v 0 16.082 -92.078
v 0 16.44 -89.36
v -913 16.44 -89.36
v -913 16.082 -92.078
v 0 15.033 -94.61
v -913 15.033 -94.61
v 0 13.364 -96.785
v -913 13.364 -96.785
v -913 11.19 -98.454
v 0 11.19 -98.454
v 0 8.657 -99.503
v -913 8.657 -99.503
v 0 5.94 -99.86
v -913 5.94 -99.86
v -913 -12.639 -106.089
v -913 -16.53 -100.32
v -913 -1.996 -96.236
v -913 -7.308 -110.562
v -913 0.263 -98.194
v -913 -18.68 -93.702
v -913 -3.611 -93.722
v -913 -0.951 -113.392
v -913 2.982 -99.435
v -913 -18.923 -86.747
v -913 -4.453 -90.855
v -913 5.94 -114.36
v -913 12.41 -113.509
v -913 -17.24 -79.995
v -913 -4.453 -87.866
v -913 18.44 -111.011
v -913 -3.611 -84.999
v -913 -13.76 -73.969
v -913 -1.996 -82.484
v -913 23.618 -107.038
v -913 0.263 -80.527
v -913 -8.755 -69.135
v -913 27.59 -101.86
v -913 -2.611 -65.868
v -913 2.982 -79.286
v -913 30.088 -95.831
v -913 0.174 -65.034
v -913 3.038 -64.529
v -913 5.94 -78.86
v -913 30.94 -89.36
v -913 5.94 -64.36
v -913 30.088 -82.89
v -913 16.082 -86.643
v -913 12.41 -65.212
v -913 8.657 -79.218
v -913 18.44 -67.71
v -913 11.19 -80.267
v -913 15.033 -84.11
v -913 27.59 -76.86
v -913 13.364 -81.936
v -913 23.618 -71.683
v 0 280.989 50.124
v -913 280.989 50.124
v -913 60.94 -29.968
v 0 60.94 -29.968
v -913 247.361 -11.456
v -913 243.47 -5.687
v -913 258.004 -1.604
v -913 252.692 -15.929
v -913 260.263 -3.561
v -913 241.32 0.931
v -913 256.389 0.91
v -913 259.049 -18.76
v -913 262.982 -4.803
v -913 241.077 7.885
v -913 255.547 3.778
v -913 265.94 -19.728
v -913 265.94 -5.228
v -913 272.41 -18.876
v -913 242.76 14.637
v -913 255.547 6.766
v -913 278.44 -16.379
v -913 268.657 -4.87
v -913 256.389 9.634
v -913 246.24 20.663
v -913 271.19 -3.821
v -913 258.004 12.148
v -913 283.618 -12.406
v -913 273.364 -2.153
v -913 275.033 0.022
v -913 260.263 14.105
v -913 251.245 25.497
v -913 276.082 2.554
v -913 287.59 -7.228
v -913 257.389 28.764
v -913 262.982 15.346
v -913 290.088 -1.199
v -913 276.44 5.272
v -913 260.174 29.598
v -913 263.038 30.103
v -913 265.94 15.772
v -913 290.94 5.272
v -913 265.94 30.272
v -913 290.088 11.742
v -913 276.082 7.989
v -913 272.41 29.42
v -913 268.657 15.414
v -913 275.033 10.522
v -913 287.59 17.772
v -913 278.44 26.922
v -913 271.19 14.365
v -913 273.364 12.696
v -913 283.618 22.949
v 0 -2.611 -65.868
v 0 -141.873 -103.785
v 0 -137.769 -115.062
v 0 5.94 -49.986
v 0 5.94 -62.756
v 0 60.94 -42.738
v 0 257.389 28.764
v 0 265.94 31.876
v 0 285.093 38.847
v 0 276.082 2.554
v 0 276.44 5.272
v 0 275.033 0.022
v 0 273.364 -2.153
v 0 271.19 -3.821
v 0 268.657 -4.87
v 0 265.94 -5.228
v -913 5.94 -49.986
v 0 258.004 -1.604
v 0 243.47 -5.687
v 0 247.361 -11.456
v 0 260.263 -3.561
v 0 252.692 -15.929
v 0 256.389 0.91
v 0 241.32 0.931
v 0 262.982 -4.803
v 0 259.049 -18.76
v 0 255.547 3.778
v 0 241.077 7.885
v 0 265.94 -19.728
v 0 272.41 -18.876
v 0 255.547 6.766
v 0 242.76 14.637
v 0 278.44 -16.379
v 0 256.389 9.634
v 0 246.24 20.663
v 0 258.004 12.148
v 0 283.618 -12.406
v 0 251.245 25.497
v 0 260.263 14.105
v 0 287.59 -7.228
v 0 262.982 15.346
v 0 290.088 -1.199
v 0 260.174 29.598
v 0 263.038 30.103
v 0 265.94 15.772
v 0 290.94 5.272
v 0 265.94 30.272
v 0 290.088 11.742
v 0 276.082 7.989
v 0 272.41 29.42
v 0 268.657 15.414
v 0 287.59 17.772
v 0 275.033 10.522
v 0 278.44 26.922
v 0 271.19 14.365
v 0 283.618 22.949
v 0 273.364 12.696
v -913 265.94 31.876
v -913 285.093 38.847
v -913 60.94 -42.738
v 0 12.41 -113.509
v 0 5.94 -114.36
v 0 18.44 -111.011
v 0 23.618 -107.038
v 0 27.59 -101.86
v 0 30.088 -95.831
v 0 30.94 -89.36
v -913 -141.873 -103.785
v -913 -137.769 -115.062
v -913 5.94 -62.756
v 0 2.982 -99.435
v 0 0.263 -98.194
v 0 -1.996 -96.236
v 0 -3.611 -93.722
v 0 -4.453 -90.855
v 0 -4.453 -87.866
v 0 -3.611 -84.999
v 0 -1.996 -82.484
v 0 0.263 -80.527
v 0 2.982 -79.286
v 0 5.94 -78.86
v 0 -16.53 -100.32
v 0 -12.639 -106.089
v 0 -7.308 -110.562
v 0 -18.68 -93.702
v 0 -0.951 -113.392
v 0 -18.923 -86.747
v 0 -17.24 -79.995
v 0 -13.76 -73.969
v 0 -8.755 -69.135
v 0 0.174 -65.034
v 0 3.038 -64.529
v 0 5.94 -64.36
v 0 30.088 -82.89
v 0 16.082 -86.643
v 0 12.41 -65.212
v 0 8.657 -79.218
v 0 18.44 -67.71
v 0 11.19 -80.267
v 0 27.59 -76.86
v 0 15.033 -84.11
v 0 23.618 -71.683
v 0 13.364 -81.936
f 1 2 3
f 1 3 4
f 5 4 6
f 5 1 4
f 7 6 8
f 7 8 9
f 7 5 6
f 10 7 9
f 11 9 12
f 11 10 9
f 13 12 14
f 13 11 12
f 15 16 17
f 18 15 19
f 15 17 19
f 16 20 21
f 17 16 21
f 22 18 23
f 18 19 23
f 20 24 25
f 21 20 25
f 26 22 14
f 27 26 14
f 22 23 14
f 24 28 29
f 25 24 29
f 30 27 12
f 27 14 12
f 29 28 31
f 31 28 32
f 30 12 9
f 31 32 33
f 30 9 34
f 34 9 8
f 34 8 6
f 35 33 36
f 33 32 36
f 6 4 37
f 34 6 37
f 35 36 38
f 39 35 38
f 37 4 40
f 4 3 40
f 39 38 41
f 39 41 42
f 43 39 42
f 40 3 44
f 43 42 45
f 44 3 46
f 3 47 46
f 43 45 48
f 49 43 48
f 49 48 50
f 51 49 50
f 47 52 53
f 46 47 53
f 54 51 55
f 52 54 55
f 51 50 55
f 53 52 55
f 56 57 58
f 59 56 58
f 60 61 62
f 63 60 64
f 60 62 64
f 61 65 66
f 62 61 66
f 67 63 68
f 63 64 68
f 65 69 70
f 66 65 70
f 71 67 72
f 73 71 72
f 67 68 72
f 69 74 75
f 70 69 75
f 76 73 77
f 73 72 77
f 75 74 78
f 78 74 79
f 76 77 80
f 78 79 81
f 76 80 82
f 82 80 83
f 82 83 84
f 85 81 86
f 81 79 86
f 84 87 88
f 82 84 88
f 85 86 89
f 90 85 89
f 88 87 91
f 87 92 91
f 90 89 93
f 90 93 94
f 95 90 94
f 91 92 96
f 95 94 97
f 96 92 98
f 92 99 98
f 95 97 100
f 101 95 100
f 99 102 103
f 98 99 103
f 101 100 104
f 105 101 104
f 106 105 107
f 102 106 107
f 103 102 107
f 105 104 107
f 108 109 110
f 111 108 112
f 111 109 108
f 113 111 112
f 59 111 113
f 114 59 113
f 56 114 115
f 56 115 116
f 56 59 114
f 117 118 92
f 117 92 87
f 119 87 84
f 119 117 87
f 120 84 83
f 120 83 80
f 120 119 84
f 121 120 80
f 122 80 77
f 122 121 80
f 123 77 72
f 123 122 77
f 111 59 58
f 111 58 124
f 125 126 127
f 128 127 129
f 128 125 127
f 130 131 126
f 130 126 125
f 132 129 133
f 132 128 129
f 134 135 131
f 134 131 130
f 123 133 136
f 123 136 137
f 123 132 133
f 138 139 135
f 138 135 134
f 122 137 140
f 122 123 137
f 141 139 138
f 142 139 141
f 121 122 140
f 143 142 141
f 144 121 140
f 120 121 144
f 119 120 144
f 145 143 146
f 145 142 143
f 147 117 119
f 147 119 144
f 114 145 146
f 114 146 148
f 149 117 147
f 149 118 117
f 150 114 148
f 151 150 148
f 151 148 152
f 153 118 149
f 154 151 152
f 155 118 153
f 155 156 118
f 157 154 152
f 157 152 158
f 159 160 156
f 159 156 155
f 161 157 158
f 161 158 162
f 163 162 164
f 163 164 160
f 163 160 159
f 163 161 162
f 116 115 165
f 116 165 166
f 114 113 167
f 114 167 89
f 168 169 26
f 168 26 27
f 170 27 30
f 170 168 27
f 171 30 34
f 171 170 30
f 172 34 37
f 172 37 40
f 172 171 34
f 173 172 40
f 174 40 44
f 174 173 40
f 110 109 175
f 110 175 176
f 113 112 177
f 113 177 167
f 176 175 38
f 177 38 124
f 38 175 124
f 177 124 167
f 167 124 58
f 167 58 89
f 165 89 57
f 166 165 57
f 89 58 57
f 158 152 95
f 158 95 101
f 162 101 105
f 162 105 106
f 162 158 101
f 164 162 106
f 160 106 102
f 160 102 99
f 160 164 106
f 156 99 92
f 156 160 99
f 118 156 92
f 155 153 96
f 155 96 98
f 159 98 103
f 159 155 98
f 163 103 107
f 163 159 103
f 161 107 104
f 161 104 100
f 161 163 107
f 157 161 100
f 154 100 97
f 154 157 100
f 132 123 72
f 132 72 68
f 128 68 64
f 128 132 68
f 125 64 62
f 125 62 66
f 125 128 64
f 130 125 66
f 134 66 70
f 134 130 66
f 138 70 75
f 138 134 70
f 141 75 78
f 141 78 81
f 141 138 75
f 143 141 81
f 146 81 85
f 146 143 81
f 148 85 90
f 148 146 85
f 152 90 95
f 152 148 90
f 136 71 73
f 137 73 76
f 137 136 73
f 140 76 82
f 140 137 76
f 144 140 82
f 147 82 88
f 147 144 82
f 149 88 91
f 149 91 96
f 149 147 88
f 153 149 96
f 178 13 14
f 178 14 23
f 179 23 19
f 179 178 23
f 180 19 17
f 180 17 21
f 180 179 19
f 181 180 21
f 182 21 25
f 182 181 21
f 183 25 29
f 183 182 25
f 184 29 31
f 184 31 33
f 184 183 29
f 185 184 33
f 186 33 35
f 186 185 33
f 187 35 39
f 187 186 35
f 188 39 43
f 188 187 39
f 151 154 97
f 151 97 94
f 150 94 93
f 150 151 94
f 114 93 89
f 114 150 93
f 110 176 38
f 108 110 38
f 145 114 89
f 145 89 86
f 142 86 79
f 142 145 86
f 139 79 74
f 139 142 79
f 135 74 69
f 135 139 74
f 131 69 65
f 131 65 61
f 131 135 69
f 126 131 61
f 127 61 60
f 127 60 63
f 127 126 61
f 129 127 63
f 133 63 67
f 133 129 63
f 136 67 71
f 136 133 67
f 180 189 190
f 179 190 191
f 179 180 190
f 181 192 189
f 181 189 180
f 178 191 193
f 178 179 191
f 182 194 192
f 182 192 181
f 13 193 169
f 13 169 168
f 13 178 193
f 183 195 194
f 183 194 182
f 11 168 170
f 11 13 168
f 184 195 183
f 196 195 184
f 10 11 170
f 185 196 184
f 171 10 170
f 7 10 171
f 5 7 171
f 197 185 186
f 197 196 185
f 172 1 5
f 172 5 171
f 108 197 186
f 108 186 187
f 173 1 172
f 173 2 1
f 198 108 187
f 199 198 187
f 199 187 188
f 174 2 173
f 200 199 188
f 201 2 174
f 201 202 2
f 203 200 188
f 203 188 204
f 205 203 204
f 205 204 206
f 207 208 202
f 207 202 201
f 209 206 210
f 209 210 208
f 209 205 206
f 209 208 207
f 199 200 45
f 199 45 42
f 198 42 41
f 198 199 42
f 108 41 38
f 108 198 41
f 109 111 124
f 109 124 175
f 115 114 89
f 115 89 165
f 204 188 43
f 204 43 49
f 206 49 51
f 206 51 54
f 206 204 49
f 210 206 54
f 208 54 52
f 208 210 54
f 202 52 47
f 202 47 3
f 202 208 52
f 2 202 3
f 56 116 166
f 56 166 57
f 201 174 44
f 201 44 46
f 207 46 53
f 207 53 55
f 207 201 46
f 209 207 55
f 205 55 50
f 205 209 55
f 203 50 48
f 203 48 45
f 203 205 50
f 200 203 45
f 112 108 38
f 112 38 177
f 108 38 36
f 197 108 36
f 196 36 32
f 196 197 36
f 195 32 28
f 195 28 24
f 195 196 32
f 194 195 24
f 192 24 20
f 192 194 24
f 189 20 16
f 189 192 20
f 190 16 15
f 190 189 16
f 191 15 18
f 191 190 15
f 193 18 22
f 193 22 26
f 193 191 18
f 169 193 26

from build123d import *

# Parameters (mm, degrees)
F1_DEPTH = 913


with BuildPart() as f1:
    # F0 (on Right) → F1 (new body)
    with BuildSketch(Plane.YZ):
        with BuildLine():
            ThreePointArc((30.9398380864, -89.3604465055), (23.617507616, -71.6827769758), (5.9398380864, -64.3604465055))
            Line((5.9398380864, -64.3604465055), (5.9398380864, -78.8604465055))
            ThreePointArc((5.9398380864, -78.8604465055), (13.3644592888, -81.935825303), (16.4398380864, -89.3604465055))
            ThreePointArc((16.4398380864, -89.3604465055), (13.3644592888, -96.785067708), (5.9398380864, -99.8604465055))
            Line((5.9398380864, -99.8604465055), (5.9398380864, -114.3604465055))
            ThreePointArc((5.9398380864, -114.3604465055), (23.617507616, -107.0381160352), (30.9398380864, -89.3604465055))
        make_face()
        with BuildLine():
            Line((5.9398380864, -78.8604465055), (5.9398380864, -64.3604465055))
            ThreePointArc((5.9398380864, -64.3604465055), (1.5986338258, -64.7402526483), (-2.6106651512, -65.8681308601))
            ThreePointArc((-2.6106651512, -65.8681308601), (-18.6803557709, -93.7016507661), (5.9398380864, -114.3604465055))
            Line((5.9398380864, -114.3604465055), (5.9398380864, -99.8604465055))
            ThreePointArc((5.9398380864, -99.8604465055), (-4.5601619136, -89.3604465055), (5.9398380864, -78.8604465055))
        make_face()
    extrude(amount=-F1_DEPTH)


with BuildPart() as f1b:
    # F0 (on Right) → F1, piece 2 (new body)
    with BuildSketch(Plane.YZ):
        with BuildLine():
            ThreePointArc((290.9398380864, 5.2718144037), (283.617507616, 22.9494839334), (265.9398380864, 30.2718144037))
            Line((265.9398380864, 30.2718144037), (265.9398380864, 15.7718144037))
            ThreePointArc((265.9398380864, 15.7718144037), (273.3644592888, 12.6964356062), (276.4398380864, 5.2718144037))
            ThreePointArc((276.4398380864, 5.2718144037), (273.3644592888, -2.1528067987), (265.9398380864, -5.2281855963))
            Line((265.9398380864, -5.2281855963), (265.9398380864, -19.7281855963))
            ThreePointArc((265.9398380864, -19.7281855963), (283.617507616, -12.4058551259), (290.9398380864, 5.2718144037))
        make_face()
        with BuildLine():
            ThreePointArc((265.9398380864, 30.2718144037), (261.5986329076, 29.892008099), (257.3893330965, 28.7641294114))
            ThreePointArc((257.3893330965, 28.7641294114), (241.319644391, 0.9306092249), (265.9398380864, -19.7281855963))
            Line((265.9398380864, -19.7281855963), (265.9398380864, -5.2281855963))
            ThreePointArc((265.9398380864, -5.2281855963), (255.4398380864, 5.2718144037), (265.9398380864, 15.7718144037))
            Line((265.9398380864, 15.7718144037), (265.9398380864, 30.2718144037))
        make_face()
    extrude(amount=-F1_DEPTH)


with BuildPart() as f1c:
    # F0 (on Right) → F1, piece 3 (new body)
    with BuildSketch(Plane.YZ):
        Polygon((265.9398380864, 44.6463919853), (60.9398380864, -29.9675060392), (60.9398380864, -42.737639309), (257.3893330965, 28.7641294114), (265.9398380864, 31.8762587156), align=None)
        Polygon((60.9398380864, -29.9675060392), (5.9398380864, -49.9858689239), (5.9398380864, -62.7560021936), (60.9398380864, -42.737639309), align=None)
        Polygon((5.9398380864, -62.7560021936), (5.9398380864, -49.9858689239), (-141.8729281845, -103.785316091), (-137.7686864646, -115.0616275405), (-2.6106651512, -65.8681308601), align=None)
        Polygon((280.9887511692, 50.1237484055), (265.9398380864, 44.6463919853), (265.9398380864, 31.8762587156), (285.0929928891, 38.8474369561), align=None)
    extrude(amount=-F1_DEPTH)


solid = Compound([f1.part, f1b.part, f1c.part])
